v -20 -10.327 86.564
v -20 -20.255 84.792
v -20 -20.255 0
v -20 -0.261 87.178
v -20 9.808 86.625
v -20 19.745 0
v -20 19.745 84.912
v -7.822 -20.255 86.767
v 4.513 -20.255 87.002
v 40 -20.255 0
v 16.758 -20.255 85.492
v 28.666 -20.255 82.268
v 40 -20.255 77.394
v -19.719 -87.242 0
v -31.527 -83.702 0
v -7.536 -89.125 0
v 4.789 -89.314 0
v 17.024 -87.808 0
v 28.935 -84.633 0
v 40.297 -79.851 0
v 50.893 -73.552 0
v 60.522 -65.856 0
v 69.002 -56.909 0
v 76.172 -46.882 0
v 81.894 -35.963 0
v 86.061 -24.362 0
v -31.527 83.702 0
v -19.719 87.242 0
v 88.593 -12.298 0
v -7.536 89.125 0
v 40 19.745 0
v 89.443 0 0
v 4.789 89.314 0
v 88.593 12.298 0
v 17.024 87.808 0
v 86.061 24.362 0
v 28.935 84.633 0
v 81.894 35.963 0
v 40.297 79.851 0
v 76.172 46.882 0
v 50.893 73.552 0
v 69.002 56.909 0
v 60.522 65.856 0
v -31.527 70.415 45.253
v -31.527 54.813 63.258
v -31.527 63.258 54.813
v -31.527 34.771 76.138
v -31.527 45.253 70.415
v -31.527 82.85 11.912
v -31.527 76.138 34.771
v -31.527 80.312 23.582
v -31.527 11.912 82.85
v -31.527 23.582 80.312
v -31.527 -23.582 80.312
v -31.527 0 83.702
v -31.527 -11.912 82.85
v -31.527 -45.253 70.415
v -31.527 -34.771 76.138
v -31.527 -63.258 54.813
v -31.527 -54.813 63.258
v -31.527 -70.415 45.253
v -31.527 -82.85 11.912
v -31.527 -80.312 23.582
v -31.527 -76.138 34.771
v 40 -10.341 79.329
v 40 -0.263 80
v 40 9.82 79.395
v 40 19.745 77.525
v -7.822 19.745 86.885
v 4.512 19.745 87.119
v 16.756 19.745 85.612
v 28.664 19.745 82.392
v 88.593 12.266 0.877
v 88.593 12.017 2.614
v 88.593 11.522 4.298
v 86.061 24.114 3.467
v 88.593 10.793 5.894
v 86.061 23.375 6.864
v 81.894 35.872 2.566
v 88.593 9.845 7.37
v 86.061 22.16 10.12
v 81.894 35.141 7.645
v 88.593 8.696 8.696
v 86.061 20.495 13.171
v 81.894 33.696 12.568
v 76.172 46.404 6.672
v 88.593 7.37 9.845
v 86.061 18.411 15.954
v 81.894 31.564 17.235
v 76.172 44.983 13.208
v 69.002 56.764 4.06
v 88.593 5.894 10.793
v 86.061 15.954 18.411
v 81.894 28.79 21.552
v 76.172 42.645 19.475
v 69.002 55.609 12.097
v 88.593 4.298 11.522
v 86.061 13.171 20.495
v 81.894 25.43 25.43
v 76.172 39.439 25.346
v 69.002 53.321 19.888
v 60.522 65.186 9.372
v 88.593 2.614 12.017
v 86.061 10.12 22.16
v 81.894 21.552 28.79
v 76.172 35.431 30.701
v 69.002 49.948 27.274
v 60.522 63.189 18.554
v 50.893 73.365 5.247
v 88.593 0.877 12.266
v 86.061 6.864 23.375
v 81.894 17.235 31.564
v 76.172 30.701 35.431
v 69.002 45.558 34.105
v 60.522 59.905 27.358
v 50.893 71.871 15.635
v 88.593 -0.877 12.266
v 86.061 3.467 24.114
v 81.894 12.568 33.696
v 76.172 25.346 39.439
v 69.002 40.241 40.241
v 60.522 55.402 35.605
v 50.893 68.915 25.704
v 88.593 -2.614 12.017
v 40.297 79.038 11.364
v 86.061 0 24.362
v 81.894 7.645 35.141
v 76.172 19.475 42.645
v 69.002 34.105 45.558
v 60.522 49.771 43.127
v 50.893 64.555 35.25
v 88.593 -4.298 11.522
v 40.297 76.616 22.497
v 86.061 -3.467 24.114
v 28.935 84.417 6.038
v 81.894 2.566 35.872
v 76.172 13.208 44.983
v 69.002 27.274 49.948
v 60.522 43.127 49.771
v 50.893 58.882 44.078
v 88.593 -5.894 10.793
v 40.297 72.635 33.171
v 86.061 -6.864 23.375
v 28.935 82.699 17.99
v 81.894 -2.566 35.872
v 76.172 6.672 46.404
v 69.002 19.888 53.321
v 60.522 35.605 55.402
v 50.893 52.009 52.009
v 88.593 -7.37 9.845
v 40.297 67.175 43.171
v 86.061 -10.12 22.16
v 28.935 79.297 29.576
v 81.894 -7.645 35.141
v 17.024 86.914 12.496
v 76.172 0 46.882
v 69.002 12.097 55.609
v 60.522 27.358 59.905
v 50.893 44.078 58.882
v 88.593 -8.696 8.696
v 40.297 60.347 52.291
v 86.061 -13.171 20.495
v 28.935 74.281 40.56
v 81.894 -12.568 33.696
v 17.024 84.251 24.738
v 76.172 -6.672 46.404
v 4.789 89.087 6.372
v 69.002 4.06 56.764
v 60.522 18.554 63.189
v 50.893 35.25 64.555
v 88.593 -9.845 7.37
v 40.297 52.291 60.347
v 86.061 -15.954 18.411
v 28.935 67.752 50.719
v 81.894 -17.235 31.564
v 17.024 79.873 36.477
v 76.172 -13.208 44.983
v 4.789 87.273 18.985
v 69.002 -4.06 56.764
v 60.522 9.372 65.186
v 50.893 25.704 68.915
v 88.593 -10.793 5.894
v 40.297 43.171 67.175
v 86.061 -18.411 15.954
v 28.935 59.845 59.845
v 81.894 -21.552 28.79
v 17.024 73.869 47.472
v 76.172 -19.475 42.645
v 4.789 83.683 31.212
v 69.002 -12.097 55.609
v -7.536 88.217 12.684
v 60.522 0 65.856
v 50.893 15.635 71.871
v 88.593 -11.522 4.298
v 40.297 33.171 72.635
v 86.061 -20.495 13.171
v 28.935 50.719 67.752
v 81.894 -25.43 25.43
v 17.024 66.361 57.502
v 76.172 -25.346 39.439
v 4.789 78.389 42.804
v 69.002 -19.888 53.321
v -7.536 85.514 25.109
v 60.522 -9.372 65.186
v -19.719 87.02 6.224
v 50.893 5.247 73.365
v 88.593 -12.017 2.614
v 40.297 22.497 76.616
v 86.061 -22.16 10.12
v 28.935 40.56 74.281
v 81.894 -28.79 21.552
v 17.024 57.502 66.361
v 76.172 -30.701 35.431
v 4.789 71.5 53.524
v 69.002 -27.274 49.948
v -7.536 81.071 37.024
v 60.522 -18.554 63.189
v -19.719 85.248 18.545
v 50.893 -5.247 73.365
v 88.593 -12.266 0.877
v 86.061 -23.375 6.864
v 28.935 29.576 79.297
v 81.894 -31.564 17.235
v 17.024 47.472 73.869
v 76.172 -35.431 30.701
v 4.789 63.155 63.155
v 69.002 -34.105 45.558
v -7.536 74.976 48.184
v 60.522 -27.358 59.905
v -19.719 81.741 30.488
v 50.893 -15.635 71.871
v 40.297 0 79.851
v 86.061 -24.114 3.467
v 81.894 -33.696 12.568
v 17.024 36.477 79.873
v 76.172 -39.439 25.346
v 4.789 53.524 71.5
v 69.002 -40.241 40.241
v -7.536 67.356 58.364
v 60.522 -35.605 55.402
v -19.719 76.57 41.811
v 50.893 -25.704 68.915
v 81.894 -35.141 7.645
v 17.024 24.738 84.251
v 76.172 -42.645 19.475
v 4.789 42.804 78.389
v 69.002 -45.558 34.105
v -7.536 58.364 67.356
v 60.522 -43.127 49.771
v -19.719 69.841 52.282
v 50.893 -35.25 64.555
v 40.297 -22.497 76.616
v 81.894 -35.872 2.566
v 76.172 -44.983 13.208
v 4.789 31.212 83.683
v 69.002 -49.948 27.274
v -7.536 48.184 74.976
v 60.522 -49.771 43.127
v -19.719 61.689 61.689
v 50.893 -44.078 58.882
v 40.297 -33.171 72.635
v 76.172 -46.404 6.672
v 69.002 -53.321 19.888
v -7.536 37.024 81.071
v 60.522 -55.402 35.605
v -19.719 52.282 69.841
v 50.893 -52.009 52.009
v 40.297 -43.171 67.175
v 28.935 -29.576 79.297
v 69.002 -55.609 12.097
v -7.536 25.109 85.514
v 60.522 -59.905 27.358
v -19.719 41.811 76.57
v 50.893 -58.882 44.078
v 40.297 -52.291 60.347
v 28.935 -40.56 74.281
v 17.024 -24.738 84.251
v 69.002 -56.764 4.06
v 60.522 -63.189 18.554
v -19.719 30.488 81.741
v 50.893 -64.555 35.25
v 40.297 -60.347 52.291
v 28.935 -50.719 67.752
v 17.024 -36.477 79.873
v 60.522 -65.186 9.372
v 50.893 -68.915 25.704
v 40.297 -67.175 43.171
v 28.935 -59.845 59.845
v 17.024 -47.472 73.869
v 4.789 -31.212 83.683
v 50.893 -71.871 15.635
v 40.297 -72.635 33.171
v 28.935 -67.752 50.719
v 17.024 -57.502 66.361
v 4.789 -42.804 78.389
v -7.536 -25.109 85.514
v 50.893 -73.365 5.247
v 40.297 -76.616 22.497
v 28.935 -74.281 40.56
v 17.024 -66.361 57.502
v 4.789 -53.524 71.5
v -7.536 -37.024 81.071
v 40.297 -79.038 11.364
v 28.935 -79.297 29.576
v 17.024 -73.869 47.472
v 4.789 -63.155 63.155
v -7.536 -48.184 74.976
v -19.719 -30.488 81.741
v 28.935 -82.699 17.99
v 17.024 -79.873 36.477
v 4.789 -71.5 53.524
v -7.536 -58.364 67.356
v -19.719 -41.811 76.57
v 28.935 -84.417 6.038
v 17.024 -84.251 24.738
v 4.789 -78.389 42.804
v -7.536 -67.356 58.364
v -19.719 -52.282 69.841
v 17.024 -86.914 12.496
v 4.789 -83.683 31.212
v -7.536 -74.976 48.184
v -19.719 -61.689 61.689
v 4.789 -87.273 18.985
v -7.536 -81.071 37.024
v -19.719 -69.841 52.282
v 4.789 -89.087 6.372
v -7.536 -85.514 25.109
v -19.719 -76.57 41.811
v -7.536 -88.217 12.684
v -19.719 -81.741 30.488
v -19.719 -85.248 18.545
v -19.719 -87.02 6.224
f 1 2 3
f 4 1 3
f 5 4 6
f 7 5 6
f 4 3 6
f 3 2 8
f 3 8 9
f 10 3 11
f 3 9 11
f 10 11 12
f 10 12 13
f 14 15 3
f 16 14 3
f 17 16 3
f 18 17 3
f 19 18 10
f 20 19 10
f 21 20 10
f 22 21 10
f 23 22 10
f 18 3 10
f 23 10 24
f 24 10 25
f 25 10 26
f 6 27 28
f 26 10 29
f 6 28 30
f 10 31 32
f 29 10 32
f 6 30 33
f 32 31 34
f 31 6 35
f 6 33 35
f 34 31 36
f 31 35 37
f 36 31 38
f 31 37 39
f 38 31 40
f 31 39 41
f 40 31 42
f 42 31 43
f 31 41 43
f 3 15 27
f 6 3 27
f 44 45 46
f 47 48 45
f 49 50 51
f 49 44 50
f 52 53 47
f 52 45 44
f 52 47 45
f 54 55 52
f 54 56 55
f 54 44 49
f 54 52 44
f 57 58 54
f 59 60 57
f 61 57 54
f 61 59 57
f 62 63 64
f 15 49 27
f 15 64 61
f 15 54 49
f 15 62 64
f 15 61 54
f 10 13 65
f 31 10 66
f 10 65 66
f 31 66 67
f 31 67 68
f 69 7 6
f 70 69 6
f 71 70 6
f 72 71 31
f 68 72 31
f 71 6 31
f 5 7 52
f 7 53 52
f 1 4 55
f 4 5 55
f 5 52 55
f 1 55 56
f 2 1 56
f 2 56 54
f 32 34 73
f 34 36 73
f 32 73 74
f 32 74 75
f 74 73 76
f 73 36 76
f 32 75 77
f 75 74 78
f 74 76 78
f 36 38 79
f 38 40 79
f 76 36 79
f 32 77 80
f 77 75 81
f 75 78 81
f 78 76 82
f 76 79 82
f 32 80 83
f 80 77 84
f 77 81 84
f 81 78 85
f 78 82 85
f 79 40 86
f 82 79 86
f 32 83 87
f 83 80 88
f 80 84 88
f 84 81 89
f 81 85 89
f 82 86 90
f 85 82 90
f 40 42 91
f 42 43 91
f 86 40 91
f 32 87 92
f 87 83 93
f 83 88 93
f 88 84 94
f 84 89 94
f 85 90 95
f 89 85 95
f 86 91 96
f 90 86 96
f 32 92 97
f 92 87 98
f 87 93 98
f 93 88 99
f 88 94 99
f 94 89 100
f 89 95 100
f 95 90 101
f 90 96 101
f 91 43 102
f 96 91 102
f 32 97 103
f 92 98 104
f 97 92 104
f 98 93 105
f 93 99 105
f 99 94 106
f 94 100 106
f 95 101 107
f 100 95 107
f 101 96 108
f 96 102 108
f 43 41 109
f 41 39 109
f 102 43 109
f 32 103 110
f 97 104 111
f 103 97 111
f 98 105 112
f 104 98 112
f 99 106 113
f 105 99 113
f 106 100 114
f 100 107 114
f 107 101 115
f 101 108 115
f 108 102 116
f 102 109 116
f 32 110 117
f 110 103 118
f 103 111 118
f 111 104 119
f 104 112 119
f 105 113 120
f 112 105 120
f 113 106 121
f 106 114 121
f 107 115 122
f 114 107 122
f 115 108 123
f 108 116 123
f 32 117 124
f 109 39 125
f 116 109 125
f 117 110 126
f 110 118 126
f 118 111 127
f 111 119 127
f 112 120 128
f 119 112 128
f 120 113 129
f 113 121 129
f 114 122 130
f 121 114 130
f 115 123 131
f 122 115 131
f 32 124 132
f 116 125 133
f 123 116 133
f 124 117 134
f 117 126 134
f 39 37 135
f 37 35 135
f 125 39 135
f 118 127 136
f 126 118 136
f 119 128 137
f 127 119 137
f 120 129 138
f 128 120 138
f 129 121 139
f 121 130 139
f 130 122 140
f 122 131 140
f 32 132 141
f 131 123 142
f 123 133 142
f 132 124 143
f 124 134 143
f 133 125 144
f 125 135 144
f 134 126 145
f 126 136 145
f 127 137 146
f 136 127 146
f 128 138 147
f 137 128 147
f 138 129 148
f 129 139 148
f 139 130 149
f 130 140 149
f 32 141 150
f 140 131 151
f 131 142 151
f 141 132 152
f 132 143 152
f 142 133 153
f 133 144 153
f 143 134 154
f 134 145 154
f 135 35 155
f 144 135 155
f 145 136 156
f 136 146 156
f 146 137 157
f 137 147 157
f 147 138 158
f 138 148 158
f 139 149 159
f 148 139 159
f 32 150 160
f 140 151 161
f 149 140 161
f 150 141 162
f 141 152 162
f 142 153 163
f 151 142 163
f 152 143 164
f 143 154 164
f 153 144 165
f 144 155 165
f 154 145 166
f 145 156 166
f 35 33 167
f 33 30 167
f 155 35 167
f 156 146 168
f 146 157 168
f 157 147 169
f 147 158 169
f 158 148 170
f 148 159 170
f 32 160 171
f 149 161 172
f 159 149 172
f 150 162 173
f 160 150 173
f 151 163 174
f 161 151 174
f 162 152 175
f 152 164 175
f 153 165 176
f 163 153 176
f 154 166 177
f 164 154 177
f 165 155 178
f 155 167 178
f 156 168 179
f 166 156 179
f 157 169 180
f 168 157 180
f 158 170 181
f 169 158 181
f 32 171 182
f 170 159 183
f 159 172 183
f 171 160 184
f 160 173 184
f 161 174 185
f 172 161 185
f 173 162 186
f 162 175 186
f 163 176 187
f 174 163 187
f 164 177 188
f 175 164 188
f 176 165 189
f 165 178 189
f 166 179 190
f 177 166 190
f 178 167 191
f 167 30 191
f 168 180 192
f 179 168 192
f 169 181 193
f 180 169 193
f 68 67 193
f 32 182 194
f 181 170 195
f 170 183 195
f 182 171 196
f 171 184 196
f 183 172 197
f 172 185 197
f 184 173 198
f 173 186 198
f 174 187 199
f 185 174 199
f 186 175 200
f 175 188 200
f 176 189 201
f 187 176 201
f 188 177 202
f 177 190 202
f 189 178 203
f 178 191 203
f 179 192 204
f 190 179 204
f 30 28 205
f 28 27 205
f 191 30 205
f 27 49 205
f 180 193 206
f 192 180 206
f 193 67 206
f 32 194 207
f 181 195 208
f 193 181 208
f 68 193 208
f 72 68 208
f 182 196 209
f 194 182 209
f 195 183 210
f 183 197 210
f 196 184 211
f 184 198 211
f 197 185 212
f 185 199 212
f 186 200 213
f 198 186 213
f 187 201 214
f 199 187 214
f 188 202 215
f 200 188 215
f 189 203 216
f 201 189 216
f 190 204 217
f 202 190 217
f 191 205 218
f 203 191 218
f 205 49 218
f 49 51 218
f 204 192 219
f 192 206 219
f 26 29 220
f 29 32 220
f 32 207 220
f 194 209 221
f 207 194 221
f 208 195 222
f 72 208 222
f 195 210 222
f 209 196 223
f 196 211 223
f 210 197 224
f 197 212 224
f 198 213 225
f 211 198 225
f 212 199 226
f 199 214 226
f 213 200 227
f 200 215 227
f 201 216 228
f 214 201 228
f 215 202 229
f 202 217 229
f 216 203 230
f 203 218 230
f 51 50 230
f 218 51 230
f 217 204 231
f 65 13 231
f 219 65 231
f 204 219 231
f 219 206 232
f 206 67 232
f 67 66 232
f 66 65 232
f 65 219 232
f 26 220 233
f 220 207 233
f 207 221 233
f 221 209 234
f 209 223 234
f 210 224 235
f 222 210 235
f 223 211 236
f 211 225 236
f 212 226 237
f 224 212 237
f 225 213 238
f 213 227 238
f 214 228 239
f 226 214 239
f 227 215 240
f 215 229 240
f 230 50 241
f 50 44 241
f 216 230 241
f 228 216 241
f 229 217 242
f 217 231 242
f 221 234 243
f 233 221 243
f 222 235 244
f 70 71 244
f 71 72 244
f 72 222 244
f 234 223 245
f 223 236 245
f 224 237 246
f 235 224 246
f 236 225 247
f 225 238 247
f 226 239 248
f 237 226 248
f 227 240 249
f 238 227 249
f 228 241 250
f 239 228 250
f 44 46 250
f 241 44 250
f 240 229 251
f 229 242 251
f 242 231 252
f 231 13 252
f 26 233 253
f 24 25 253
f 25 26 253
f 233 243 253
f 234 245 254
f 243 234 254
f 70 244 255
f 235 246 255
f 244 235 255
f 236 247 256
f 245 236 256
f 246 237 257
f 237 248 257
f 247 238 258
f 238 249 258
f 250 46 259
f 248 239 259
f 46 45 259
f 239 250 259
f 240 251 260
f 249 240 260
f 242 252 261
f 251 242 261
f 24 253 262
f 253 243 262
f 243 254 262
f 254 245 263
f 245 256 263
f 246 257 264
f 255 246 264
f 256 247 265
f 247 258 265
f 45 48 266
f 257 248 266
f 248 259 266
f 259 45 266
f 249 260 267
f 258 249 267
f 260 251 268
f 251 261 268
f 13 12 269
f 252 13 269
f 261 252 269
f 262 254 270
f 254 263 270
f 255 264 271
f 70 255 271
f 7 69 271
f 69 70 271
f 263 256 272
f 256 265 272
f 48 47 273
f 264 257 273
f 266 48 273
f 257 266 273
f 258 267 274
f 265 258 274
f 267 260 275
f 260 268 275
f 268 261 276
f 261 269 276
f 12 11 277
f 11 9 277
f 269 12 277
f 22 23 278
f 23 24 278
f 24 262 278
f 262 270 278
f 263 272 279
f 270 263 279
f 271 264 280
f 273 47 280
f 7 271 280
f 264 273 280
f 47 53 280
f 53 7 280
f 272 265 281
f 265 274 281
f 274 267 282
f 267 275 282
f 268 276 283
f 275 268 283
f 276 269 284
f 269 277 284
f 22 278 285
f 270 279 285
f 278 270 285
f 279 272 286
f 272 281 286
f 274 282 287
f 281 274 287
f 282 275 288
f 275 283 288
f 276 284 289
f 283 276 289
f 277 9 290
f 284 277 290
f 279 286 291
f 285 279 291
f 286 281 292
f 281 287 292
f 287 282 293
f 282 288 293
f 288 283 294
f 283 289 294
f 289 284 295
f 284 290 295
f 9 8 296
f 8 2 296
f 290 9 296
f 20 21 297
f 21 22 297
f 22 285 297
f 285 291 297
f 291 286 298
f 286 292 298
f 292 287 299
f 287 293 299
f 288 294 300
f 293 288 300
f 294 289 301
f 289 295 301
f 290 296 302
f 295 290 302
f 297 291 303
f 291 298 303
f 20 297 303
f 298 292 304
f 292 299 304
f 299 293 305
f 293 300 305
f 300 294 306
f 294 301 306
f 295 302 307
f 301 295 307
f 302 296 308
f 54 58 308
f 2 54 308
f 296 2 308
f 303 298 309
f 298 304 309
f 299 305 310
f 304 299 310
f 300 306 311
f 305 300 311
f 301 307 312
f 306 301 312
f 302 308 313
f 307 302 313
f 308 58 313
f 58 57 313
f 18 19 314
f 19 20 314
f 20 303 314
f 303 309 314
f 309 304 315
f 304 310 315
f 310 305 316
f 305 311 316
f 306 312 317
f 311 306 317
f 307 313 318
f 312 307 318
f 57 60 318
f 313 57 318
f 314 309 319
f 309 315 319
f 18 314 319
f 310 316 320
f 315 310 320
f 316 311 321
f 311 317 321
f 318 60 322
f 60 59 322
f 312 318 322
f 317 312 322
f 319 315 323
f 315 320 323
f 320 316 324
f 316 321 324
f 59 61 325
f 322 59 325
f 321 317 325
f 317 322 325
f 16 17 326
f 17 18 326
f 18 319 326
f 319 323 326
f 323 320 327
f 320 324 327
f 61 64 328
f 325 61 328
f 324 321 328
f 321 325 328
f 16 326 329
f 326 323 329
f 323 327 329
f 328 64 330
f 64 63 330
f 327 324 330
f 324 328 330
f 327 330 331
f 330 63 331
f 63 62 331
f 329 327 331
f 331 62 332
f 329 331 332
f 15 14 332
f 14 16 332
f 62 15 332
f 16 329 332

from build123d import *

# Parameters (mm, degrees)
F0_W          = 60
F0_H          = 40
F1_DEPTH      = 80
F4_W          = 60
F4_H          = 40
F5_DEPTH      = 25
F5_DEPTH_BACK = 80
F7_E7_W       = 192.0395717025
F7_E7_H       = 176.2685924768
F8_DEPTH      = 68.6223879457
F9_W          = 146.8224227428
F9_H          = 227.745719254
F10_DEPTH     = 104.3368522078


with BuildPart() as f1:
    # F0 (on Top) → F1 (new body)
    with BuildSketch(Plane.XY):
        with Locations((10, -0.2545155585)):
            Rectangle(F0_W, F0_H)
    extrude(amount=F1_DEPTH)

    # F2 (on Front) → F3 (revolve)
    with BuildSketch(Plane.XZ):
        with BuildLine():
            ThreePointArc((89.4427191, 0), (76.0845213036, 47.0228201834), (40, 80))
            Line((40, 80), (40, 0))
            Line((40, 0), (89.4427191, 0))
        make_face()
        with BuildLine():
            Line((40, 0), (40, 80))
            ThreePointArc((40, 80), (-47.0228201834, 76.0845213036), (-89.4427191, 0))
            Line((-89.4427191, 0), (40, 0))
        make_face()
    revolve(axis=Axis((0, 0, 0), (1, 0, 0)))

    # F4 (on face) → F5 (cut, two sides)
    with BuildSketch(Plane.XY.offset(80)) as f5_sk:
        with Locations((10, -0.2545155585)):
            Rectangle(F4_W, F4_H)
    extrude(amount=F5_DEPTH, mode=Mode.SUBTRACT)
    extrude(f5_sk.sketch, amount=-F5_DEPTH_BACK, mode=Mode.SUBTRACT)

    # F7_E7 (on explicit) → F8 (cut)
    with BuildSketch(Plane(origin=(-31.5267369151, 88.1342962384, 105.66496104), x_dir=(0, 0, -1), z_dir=(-1, 0, 0))):
        with Locations((96.0197858512, 88.1342962384)):
            Rectangle(F7_E7_W, F7_E7_H)
    extrude(amount=F8_DEPTH, mode=Mode.SUBTRACT)

    # F9 (on Top) → F10 (cut)
    with BuildSketch(Plane.XY):
        with Locations((26.485607028, 2.56710127)):
            Rectangle(F9_W, F9_H)
    extrude(amount=-F10_DEPTH, mode=Mode.SUBTRACT)


solid = f1.part
